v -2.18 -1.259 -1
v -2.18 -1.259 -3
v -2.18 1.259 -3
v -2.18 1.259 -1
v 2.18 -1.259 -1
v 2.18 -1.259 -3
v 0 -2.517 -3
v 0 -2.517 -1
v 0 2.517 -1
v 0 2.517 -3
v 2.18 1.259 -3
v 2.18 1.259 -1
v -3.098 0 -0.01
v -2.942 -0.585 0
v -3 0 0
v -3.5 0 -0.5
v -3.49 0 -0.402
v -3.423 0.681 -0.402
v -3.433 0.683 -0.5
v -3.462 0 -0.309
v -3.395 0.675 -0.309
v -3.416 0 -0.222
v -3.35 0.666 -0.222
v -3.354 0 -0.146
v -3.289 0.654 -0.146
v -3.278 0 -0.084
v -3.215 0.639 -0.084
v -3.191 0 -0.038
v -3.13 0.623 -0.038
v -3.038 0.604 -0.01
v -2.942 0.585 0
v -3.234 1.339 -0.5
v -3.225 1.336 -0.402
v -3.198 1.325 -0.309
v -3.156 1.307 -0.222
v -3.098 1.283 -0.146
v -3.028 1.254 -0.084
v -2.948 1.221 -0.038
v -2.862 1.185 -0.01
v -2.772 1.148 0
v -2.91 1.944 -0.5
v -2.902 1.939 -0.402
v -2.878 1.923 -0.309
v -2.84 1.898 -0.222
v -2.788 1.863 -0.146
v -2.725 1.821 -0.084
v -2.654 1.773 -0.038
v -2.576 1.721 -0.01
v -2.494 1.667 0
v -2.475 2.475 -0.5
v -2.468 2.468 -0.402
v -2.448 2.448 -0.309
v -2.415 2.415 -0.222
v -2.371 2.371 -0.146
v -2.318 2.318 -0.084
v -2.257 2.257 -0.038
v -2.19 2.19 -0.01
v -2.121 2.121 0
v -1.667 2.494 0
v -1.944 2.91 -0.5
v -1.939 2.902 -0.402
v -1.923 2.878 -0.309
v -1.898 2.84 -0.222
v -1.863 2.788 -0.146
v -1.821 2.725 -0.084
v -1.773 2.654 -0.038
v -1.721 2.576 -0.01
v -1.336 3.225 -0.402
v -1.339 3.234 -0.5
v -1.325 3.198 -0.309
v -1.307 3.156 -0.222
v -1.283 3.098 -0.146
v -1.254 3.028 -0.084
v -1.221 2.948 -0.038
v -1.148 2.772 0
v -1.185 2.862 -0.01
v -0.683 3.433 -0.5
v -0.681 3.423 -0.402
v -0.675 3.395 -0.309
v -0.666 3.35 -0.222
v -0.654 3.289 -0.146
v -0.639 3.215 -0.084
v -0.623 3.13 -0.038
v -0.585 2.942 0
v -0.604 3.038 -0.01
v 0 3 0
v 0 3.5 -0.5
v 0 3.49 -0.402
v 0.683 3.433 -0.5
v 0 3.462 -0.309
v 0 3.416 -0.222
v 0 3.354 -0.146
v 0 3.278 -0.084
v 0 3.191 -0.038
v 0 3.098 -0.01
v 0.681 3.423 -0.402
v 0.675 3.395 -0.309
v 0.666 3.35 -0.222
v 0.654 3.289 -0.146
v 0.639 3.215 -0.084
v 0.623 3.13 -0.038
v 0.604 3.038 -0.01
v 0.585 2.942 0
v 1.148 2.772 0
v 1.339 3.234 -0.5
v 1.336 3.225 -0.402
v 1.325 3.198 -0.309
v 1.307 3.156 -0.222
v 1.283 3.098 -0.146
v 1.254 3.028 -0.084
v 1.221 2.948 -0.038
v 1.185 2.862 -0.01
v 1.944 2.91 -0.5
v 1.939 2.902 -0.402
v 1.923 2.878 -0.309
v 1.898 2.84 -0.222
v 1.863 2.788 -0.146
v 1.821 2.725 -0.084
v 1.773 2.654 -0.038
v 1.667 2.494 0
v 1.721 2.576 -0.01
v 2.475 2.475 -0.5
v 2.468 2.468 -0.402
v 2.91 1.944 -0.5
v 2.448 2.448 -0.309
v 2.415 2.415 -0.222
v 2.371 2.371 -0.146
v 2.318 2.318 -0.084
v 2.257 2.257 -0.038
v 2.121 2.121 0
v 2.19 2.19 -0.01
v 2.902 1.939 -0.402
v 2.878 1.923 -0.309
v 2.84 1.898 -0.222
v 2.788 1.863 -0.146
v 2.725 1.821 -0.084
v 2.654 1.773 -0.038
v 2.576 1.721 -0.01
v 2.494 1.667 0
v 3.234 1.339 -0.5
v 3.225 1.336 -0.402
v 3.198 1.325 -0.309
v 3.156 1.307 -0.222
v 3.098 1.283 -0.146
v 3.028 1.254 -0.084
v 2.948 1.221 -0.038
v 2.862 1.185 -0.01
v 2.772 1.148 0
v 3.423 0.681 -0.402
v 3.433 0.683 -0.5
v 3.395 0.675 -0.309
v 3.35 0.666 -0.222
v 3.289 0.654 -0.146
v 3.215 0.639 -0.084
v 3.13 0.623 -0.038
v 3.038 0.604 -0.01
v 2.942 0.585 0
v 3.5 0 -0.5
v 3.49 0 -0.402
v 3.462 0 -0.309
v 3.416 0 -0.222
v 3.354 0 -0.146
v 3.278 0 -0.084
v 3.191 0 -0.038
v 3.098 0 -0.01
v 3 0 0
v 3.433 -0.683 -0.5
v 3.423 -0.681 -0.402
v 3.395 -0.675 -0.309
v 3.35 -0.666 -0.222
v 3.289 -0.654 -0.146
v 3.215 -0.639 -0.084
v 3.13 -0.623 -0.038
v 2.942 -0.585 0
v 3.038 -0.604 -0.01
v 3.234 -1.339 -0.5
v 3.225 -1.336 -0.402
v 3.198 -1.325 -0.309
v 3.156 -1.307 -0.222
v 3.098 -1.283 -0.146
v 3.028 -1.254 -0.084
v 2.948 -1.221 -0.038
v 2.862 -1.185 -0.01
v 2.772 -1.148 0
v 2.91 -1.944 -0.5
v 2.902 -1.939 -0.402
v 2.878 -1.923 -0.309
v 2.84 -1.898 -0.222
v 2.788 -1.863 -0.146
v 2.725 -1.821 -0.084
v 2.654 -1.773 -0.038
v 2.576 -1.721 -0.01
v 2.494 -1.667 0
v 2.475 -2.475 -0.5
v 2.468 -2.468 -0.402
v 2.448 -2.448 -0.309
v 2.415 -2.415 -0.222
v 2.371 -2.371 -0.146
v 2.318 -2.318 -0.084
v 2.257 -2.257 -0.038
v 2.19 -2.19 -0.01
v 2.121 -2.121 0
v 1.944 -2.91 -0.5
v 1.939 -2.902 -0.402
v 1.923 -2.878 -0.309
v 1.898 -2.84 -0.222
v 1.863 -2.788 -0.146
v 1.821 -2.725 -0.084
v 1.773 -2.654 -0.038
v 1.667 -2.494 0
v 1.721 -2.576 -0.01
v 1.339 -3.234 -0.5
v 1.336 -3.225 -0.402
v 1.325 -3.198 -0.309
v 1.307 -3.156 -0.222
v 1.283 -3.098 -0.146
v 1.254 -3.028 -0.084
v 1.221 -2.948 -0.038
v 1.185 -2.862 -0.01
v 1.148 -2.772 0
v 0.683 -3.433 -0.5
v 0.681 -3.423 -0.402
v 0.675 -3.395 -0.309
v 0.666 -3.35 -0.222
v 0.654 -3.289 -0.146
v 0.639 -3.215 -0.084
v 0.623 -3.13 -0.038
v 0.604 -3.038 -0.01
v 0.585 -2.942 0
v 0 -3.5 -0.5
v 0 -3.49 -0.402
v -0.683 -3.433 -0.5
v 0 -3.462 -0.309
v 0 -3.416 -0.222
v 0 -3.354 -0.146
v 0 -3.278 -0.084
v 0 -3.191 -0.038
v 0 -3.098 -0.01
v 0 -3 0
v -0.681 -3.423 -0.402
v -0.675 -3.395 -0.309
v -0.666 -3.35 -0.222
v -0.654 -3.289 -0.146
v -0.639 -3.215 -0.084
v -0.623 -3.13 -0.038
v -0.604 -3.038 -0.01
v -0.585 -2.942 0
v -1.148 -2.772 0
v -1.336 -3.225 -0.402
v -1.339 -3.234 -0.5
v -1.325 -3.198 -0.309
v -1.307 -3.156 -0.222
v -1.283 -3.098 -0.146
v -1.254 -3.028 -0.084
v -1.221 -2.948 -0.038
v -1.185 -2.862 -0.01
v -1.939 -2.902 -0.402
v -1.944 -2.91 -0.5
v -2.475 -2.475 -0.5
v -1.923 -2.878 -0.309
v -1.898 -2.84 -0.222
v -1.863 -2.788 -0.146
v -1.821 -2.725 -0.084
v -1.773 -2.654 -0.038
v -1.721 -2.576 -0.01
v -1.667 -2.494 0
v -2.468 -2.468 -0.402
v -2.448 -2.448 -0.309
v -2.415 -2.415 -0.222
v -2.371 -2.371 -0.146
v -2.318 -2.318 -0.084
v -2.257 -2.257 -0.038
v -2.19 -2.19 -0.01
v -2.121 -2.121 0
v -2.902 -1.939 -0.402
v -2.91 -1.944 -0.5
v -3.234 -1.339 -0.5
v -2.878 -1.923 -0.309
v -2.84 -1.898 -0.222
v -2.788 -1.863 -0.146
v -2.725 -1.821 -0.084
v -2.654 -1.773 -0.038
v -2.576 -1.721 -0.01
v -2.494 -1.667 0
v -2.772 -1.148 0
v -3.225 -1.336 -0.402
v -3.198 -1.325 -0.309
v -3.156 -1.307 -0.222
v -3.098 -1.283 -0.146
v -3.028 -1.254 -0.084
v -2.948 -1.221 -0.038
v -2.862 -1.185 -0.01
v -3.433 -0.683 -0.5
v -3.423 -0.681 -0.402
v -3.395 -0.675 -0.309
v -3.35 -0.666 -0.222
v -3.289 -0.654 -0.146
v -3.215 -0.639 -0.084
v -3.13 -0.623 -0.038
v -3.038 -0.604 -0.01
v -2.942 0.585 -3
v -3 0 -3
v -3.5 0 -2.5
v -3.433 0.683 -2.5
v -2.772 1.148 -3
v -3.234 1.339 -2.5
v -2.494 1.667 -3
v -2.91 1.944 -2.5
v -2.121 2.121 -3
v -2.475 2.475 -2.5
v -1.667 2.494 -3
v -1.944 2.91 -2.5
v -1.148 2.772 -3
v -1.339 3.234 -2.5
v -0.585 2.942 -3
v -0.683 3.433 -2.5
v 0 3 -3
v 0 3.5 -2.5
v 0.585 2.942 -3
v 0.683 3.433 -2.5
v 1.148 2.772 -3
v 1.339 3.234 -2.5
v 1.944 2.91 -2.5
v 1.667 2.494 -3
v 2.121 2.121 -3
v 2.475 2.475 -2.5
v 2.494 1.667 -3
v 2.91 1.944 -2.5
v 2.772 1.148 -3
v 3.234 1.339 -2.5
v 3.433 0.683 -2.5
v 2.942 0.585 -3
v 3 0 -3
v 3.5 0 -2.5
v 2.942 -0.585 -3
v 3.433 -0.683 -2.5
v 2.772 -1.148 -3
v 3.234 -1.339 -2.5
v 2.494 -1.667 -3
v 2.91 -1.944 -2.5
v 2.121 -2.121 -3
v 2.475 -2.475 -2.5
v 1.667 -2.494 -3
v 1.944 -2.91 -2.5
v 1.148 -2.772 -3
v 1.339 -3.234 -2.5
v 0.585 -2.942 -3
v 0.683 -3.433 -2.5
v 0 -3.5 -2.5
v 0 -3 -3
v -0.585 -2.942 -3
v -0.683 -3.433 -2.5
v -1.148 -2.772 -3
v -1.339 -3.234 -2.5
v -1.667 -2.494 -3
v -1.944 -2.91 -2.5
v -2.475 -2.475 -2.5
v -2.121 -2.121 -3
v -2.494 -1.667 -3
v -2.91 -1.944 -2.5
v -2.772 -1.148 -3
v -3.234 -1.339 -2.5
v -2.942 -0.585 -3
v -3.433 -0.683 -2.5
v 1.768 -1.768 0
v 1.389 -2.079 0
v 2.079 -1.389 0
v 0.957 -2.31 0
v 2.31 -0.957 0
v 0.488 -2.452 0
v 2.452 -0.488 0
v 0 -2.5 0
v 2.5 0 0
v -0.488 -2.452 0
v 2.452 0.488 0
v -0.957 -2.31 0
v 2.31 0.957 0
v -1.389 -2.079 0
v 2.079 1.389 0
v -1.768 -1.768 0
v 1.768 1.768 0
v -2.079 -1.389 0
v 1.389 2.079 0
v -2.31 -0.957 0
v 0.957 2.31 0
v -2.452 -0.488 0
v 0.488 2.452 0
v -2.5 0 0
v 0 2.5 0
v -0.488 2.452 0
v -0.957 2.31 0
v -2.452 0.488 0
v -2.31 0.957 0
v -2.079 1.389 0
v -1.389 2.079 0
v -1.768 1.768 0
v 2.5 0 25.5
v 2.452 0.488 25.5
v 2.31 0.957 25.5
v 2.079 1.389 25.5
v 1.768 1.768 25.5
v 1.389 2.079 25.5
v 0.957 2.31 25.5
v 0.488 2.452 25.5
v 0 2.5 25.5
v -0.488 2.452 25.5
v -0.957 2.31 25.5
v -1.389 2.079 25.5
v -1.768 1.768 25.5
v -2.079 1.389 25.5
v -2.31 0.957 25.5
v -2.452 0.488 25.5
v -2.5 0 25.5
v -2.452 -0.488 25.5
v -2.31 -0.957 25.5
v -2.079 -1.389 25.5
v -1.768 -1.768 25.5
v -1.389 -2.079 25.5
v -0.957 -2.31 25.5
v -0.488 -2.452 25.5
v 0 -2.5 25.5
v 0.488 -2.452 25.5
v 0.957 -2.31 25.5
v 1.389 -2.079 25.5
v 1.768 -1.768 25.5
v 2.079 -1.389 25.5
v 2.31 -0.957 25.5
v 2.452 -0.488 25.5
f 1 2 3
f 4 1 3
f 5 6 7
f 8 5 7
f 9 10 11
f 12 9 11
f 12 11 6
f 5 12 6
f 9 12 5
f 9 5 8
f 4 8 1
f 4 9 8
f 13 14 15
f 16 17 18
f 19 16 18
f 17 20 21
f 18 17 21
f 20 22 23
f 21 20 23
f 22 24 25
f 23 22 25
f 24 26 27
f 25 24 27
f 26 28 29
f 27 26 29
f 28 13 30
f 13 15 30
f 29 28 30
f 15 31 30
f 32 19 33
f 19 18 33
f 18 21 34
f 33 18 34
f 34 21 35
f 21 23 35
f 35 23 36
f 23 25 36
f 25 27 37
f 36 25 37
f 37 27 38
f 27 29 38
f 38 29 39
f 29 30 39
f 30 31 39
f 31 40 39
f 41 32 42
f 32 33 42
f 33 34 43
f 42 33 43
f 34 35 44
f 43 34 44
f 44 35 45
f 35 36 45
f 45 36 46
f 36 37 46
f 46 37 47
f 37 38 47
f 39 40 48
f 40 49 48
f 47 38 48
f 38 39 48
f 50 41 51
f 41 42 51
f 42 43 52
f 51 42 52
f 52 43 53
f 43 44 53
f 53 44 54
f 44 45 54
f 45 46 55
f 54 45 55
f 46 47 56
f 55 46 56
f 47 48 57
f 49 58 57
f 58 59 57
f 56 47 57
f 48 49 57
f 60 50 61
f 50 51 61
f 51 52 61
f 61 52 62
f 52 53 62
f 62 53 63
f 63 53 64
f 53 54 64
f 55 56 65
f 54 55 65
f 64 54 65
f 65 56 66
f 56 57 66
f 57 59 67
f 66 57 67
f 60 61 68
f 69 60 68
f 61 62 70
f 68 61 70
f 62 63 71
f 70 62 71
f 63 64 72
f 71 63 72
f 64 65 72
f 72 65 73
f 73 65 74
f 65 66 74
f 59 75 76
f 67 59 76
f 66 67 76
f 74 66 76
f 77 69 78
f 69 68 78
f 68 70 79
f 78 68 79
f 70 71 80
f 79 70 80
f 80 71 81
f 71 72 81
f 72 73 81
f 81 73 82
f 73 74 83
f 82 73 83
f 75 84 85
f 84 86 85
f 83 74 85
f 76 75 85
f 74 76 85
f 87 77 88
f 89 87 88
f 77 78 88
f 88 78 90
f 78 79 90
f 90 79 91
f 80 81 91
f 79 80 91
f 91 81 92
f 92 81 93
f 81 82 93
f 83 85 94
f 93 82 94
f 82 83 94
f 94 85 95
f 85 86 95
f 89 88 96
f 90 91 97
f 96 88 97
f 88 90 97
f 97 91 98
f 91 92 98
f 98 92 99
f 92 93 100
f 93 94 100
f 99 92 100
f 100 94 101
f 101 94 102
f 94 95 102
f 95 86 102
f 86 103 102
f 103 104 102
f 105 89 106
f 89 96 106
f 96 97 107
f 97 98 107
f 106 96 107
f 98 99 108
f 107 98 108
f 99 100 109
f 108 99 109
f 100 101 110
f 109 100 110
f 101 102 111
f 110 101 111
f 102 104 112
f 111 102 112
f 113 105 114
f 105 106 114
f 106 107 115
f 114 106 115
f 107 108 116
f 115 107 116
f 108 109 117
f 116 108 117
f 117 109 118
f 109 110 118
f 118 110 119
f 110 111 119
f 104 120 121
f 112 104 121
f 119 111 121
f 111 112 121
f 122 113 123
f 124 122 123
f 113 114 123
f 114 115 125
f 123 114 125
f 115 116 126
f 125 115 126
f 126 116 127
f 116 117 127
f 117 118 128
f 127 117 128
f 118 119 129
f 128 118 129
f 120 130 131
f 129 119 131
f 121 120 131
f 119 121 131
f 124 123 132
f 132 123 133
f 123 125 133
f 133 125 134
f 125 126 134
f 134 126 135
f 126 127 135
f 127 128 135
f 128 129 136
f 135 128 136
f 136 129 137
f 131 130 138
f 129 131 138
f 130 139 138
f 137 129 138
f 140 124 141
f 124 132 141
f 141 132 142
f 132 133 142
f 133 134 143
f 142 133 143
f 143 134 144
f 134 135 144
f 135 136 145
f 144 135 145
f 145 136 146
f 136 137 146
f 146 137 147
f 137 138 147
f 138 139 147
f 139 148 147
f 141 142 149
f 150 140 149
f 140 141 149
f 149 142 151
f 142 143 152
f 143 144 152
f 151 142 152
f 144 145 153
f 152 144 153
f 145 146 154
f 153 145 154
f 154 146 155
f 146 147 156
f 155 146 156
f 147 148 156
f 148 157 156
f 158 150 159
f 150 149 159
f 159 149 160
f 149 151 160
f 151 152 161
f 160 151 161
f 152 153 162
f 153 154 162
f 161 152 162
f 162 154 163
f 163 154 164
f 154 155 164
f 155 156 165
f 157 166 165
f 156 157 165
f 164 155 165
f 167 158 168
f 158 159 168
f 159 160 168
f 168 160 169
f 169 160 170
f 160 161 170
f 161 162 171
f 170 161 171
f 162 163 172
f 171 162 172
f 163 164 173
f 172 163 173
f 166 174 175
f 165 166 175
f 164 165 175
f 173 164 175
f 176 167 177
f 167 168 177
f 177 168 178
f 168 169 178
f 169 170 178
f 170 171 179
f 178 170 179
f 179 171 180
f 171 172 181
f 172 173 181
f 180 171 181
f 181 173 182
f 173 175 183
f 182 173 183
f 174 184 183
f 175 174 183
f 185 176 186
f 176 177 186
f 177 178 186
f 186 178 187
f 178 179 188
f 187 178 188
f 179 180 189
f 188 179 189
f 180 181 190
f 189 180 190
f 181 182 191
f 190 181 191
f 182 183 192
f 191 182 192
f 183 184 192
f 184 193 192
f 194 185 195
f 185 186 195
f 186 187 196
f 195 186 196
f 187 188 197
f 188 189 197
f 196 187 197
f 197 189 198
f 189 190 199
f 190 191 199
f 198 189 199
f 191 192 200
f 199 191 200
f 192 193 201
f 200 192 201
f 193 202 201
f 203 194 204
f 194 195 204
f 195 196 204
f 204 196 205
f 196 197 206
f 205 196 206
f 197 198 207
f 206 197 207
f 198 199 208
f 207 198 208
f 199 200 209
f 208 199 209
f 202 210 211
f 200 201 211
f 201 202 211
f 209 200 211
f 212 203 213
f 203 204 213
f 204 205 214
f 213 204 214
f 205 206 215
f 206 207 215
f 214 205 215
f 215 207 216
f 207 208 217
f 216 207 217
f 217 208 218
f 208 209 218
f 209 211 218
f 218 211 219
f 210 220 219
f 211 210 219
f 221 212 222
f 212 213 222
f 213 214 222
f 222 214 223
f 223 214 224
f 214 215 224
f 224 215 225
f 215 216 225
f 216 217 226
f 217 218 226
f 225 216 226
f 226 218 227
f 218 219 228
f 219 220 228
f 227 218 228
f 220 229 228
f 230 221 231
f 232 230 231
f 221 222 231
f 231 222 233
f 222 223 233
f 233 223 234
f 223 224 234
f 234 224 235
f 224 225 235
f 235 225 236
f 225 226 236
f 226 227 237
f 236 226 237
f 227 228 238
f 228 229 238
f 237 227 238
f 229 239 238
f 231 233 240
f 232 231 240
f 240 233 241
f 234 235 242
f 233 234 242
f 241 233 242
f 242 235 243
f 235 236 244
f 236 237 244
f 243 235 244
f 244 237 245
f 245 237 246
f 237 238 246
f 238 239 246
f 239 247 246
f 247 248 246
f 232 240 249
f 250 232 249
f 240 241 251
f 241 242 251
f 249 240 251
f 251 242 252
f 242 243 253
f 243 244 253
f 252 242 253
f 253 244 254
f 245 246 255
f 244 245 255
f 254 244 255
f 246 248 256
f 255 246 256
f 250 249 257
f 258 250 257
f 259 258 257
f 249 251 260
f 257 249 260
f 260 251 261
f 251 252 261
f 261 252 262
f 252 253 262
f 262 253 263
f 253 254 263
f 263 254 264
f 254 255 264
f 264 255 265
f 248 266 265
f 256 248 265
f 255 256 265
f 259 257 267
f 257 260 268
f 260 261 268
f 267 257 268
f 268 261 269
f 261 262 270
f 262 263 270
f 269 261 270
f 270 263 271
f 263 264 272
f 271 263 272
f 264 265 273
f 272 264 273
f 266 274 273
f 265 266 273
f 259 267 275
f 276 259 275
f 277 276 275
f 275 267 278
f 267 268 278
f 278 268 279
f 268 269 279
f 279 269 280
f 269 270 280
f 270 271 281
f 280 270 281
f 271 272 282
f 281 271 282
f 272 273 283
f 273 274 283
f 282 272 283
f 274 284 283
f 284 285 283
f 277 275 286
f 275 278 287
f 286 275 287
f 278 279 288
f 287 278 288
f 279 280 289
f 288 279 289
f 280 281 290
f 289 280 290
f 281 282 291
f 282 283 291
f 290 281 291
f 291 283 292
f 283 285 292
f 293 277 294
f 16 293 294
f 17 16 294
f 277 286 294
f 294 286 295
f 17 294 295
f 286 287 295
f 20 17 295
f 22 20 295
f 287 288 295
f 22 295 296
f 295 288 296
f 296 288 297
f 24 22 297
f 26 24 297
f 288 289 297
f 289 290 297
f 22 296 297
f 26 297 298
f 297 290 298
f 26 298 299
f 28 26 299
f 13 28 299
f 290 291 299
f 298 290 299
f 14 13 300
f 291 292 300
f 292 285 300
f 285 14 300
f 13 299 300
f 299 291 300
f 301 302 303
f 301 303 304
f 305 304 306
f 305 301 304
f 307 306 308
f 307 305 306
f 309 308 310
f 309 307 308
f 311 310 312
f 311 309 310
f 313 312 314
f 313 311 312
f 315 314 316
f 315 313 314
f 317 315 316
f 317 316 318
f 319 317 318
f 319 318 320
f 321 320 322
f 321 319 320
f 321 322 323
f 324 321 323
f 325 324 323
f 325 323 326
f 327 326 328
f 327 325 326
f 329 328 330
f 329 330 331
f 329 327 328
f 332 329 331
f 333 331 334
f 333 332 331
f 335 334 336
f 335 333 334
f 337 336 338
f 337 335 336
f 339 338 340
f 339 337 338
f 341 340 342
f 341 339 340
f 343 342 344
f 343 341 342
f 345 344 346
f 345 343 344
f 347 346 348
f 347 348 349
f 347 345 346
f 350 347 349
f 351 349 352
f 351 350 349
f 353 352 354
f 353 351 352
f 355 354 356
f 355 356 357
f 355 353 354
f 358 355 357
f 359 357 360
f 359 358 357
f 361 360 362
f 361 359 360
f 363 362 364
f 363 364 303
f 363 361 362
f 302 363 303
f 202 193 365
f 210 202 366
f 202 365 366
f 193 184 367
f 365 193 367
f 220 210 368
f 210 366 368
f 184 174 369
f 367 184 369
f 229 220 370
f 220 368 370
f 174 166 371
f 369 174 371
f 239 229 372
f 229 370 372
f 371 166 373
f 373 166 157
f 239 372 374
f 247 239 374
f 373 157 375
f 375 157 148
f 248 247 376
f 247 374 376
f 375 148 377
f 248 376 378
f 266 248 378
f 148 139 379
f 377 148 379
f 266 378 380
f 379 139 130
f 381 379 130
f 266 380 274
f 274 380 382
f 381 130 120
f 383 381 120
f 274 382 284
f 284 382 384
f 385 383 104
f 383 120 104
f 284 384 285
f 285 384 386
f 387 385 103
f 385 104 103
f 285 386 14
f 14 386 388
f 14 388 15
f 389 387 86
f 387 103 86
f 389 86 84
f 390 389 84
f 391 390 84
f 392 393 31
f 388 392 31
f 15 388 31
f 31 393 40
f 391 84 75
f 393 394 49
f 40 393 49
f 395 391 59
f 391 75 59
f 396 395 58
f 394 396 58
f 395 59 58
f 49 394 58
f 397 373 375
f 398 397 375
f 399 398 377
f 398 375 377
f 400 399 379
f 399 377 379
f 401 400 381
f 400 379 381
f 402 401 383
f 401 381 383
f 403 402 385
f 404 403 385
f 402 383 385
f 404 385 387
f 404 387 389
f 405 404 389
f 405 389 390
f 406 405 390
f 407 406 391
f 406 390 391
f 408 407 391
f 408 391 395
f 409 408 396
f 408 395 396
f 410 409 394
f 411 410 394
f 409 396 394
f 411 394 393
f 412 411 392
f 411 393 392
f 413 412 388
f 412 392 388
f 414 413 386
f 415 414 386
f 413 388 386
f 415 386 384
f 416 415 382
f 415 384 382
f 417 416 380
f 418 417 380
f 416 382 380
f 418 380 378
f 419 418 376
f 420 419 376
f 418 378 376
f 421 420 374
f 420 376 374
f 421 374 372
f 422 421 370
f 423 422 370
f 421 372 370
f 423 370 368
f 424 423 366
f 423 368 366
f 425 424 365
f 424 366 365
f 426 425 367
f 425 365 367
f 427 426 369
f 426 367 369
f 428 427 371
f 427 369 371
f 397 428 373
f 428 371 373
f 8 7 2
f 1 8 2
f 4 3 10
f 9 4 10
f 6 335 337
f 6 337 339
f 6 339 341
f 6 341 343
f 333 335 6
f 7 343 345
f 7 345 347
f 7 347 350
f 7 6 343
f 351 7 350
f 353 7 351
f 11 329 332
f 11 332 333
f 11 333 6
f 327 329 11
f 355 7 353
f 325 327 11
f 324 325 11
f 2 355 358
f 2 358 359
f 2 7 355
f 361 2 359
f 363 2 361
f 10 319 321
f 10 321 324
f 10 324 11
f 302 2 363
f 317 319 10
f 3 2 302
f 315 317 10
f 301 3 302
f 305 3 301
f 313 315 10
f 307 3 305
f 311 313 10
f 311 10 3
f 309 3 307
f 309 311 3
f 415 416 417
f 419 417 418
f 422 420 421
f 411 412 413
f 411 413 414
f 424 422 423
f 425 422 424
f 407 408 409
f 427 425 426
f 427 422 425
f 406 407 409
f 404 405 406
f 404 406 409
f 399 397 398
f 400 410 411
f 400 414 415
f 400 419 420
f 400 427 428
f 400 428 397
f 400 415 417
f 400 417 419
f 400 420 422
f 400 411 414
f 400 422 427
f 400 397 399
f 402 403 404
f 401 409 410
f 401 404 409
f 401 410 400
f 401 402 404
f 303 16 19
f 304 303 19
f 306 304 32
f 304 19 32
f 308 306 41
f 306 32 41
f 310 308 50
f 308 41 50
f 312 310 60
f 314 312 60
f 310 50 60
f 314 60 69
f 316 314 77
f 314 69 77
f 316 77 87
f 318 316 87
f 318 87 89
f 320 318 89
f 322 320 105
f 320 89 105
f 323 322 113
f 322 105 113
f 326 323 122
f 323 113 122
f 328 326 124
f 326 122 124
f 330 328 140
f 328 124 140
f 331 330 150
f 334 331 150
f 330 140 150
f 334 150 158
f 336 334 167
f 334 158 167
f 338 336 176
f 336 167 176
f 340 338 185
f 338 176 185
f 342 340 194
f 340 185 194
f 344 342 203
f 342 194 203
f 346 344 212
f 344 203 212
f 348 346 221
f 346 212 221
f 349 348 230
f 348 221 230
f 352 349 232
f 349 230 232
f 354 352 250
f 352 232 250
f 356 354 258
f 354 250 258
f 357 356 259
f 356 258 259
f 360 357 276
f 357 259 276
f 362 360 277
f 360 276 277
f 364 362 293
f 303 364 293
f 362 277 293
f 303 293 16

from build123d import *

# Parameters (mm, degrees)
SKETCH1_R           = 2.5
BOSS_EXTRUDE2_DEPTH = 25.5
SKETCH2_R           = 3.5
BOSS_EXTRUDE3_DEPTH = 3
CUT_EXTRUDE2_DEPTH  = 2
CHAMFER2_SIZE       = 0.5
FILLET5_R           = 0.5


with BuildPart() as part:
    # Sketch1 → Boss-Extrude2 (new body)
    with BuildSketch(Plane.XY):
        Circle(SKETCH1_R)
    extrude(amount=BOSS_EXTRUDE2_DEPTH)

    # Sketch2 → Boss-Extrude3 (add)
    with BuildSketch(Plane(origin=(0, 0, 0), x_dir=(-1, 0, 0), z_dir=(0, 0, -1))):
        Circle(SKETCH2_R)
    extrude(amount=BOSS_EXTRUDE3_DEPTH)

    # Sketch4 → Cut-Extrude2 (cut)
    with BuildSketch(Plane(origin=(0, 0, -3), x_dir=(-1, 0, 0), z_dir=(0, 0, -1))):
        Polygon((2.180058464, 0), (0, 0), (0, -2.517314682), (2.180058464, -1.258657341), align=None)
        Polygon((2.180058464, 1.258657341), (0, 2.517314682), (0, 0), (2.180058464, 0), align=None)
        Polygon((0, 0), (0, 2.517314682), (-2.180058464, 1.258657341), (-2.180058464, 0), align=None)
        Polygon((0, -2.517314682), (0, 0), (-2.180058464, 0), (-2.180058464, -1.258657341), align=None)
    extrude(amount=-CUT_EXTRUDE2_DEPTH, mode=Mode.SUBTRACT)

    # Chamfer2
    chamfer2_edges = [part.edges().sort_by_distance(p)[0] for p in [
        (3.5, 0, -3),
    ]]
    chamfer(chamfer2_edges, length=CHAMFER2_SIZE)

    # Fillet5
    fillet5_edges = [part.edges().sort_by_distance(p)[0] for p in [
        (3.5, 0, 0),
    ]]
    fillet(fillet5_edges, radius=FILLET5_R)


solid = part.part
